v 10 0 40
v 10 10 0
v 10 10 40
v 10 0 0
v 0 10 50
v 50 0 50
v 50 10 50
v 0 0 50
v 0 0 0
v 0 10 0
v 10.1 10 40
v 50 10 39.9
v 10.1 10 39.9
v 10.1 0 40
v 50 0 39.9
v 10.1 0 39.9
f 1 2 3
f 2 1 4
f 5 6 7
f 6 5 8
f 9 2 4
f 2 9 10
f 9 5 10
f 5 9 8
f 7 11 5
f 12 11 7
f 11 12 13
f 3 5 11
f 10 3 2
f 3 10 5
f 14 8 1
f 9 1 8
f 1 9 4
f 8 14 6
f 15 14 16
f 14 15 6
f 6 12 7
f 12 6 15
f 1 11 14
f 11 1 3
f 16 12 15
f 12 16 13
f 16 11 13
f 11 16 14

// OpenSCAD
cube([10,10,50]);
translate([0,0,40])
	cube([50,10,10]);
translate([10.1,0,39.9])
	cube([39.9,10,10]);
